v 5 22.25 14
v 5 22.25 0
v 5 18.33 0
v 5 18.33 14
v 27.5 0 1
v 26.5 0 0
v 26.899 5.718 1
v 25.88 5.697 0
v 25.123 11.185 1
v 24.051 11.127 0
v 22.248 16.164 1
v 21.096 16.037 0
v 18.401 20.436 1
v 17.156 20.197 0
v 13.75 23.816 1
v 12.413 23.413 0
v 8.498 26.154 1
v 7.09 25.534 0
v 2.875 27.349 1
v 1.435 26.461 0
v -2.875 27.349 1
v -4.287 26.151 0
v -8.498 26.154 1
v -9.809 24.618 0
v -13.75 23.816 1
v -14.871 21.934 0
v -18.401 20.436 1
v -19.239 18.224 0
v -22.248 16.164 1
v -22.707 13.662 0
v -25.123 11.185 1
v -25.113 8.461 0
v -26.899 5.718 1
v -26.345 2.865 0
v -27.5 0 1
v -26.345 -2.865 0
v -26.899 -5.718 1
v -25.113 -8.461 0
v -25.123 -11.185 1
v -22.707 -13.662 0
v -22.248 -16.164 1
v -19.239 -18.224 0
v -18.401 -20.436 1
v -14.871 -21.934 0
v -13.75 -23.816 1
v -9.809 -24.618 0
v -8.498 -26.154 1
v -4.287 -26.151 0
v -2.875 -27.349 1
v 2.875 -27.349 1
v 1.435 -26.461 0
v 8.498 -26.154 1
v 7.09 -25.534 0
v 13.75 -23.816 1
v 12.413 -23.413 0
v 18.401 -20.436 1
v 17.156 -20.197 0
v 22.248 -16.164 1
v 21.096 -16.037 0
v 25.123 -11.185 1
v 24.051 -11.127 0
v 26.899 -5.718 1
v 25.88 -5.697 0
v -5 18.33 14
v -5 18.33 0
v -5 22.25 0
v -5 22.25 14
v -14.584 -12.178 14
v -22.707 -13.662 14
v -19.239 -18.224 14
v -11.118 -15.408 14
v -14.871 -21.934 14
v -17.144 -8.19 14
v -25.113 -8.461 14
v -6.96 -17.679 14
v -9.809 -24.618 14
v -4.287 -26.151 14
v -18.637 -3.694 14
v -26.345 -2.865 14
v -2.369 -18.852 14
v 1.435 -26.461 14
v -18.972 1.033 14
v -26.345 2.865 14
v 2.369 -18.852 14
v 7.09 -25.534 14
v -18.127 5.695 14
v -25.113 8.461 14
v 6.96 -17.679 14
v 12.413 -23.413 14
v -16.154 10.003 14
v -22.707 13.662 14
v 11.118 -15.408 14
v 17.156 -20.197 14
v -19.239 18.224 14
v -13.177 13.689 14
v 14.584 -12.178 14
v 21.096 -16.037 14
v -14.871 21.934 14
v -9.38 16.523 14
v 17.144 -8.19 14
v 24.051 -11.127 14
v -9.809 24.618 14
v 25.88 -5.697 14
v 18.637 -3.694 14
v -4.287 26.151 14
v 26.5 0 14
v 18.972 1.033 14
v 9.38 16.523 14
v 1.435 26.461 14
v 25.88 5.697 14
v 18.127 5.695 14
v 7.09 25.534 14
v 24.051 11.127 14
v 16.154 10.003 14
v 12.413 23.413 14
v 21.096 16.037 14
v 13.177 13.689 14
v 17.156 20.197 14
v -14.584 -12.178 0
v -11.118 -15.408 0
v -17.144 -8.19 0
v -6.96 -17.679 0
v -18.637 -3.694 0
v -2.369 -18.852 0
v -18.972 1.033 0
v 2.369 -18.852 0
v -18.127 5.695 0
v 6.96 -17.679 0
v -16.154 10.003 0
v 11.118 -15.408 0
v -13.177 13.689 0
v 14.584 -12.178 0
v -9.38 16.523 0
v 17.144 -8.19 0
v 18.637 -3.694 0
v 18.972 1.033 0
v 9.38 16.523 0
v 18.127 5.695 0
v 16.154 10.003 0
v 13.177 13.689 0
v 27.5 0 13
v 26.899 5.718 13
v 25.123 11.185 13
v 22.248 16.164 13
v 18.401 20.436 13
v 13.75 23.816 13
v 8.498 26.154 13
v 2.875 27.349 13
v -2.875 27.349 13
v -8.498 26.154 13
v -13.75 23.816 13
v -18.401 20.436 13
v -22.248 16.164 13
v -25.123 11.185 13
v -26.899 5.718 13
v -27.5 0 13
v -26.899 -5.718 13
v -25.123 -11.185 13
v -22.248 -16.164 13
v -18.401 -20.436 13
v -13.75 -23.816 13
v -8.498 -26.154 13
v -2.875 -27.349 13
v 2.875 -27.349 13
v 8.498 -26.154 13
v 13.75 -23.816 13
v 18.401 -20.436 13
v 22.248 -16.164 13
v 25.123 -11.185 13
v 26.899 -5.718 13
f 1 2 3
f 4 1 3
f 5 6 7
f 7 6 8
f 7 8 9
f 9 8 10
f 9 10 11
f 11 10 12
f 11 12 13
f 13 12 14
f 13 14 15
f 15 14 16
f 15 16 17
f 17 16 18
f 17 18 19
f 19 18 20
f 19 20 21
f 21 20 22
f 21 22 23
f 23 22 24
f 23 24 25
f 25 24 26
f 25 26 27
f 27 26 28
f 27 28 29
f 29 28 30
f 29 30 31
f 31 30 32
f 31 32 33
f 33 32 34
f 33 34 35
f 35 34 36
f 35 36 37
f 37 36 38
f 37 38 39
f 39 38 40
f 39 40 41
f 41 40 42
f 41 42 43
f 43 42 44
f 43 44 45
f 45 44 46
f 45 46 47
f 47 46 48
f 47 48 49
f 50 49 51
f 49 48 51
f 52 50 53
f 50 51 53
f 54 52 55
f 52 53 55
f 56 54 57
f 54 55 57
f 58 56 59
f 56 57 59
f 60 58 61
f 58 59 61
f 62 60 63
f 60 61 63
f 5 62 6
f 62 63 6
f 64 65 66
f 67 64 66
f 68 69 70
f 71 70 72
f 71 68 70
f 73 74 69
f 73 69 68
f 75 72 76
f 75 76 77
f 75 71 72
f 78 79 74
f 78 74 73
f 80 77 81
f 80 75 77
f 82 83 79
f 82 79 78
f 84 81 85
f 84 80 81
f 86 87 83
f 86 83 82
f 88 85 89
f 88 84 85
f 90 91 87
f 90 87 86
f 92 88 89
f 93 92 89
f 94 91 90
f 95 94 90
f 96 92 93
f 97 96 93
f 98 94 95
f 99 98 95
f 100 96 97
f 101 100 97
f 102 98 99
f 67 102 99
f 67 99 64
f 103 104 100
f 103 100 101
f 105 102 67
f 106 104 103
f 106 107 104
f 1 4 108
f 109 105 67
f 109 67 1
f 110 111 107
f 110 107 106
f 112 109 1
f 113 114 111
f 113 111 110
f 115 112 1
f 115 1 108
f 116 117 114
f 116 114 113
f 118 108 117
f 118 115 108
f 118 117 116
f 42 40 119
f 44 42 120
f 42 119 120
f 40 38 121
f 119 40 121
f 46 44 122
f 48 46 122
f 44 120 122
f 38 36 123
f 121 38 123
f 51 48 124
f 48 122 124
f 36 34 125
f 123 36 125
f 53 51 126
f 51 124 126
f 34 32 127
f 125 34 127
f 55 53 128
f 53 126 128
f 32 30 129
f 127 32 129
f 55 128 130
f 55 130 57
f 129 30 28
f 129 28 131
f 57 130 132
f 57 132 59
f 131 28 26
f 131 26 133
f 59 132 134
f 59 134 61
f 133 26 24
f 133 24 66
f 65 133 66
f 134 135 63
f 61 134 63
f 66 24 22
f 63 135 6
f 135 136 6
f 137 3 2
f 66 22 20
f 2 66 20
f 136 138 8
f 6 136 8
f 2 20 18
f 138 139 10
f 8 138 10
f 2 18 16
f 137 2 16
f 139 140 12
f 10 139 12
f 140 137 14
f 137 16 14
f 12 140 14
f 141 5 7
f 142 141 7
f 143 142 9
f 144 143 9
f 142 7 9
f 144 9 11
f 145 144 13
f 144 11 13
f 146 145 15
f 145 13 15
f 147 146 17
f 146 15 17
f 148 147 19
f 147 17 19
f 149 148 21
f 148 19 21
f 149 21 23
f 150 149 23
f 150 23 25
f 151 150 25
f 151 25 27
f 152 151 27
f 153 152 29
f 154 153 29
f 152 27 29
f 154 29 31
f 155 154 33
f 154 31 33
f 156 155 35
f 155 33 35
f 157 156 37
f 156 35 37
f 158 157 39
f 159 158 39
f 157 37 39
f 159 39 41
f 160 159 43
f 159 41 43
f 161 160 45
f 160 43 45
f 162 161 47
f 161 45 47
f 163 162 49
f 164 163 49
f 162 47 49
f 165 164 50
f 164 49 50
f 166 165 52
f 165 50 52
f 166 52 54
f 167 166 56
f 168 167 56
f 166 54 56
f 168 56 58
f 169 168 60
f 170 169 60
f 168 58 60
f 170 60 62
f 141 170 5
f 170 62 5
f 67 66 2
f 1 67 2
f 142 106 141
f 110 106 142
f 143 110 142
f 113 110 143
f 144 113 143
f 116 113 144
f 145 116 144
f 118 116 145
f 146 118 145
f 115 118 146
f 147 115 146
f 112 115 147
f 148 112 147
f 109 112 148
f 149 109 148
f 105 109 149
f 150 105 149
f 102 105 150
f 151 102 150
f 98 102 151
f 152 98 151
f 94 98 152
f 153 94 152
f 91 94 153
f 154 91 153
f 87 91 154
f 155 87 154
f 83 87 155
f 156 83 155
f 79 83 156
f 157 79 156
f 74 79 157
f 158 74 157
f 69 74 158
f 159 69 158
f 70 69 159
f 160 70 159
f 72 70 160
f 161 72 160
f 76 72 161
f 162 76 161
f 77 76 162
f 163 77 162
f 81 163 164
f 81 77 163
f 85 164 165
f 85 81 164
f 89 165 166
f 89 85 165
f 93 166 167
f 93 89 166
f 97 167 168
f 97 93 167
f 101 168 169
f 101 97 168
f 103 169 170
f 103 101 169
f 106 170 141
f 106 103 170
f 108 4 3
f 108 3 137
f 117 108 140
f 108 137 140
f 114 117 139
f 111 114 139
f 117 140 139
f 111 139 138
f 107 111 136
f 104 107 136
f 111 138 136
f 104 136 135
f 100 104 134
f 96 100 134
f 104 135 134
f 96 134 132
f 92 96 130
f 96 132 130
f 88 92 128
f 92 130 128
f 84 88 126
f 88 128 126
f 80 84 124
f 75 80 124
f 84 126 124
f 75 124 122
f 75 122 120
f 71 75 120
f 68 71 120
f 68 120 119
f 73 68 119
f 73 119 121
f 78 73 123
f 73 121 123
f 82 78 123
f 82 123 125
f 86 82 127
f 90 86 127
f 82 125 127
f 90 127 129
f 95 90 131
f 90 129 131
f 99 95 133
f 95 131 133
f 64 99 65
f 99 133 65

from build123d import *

# Parameters (mm, degrees)
F0_R     = 27.5
F1_DEPTH = 14
F2_SIZE  = 1


with BuildPart() as f1:
    # F0 (on Top) → F1 (new body)
    with BuildSketch(Plane.XY):
        Circle(F0_R)
        with BuildLine():
            ThreePointArc((5, 18.330303), (0, -19), (-5, 18.330303))
            Line((-5, 18.330303), (-5, 22.25))
            Line((-5, 22.25), (0, 22.25))
            Line((0, 22.25), (5, 22.25))
            Line((5, 22.25), (5, 18.330303))
        make_face(mode=Mode.SUBTRACT)
    extrude(amount=F1_DEPTH)

    # F2
    f2_edges = [f1.edges().sort_by_distance(p)[0] for p in [
        (-27.5, 0, 14),
        (-27.5, 0, 0),
    ]]
    chamfer(f2_edges, length=F2_SIZE)


solid = f1.part
